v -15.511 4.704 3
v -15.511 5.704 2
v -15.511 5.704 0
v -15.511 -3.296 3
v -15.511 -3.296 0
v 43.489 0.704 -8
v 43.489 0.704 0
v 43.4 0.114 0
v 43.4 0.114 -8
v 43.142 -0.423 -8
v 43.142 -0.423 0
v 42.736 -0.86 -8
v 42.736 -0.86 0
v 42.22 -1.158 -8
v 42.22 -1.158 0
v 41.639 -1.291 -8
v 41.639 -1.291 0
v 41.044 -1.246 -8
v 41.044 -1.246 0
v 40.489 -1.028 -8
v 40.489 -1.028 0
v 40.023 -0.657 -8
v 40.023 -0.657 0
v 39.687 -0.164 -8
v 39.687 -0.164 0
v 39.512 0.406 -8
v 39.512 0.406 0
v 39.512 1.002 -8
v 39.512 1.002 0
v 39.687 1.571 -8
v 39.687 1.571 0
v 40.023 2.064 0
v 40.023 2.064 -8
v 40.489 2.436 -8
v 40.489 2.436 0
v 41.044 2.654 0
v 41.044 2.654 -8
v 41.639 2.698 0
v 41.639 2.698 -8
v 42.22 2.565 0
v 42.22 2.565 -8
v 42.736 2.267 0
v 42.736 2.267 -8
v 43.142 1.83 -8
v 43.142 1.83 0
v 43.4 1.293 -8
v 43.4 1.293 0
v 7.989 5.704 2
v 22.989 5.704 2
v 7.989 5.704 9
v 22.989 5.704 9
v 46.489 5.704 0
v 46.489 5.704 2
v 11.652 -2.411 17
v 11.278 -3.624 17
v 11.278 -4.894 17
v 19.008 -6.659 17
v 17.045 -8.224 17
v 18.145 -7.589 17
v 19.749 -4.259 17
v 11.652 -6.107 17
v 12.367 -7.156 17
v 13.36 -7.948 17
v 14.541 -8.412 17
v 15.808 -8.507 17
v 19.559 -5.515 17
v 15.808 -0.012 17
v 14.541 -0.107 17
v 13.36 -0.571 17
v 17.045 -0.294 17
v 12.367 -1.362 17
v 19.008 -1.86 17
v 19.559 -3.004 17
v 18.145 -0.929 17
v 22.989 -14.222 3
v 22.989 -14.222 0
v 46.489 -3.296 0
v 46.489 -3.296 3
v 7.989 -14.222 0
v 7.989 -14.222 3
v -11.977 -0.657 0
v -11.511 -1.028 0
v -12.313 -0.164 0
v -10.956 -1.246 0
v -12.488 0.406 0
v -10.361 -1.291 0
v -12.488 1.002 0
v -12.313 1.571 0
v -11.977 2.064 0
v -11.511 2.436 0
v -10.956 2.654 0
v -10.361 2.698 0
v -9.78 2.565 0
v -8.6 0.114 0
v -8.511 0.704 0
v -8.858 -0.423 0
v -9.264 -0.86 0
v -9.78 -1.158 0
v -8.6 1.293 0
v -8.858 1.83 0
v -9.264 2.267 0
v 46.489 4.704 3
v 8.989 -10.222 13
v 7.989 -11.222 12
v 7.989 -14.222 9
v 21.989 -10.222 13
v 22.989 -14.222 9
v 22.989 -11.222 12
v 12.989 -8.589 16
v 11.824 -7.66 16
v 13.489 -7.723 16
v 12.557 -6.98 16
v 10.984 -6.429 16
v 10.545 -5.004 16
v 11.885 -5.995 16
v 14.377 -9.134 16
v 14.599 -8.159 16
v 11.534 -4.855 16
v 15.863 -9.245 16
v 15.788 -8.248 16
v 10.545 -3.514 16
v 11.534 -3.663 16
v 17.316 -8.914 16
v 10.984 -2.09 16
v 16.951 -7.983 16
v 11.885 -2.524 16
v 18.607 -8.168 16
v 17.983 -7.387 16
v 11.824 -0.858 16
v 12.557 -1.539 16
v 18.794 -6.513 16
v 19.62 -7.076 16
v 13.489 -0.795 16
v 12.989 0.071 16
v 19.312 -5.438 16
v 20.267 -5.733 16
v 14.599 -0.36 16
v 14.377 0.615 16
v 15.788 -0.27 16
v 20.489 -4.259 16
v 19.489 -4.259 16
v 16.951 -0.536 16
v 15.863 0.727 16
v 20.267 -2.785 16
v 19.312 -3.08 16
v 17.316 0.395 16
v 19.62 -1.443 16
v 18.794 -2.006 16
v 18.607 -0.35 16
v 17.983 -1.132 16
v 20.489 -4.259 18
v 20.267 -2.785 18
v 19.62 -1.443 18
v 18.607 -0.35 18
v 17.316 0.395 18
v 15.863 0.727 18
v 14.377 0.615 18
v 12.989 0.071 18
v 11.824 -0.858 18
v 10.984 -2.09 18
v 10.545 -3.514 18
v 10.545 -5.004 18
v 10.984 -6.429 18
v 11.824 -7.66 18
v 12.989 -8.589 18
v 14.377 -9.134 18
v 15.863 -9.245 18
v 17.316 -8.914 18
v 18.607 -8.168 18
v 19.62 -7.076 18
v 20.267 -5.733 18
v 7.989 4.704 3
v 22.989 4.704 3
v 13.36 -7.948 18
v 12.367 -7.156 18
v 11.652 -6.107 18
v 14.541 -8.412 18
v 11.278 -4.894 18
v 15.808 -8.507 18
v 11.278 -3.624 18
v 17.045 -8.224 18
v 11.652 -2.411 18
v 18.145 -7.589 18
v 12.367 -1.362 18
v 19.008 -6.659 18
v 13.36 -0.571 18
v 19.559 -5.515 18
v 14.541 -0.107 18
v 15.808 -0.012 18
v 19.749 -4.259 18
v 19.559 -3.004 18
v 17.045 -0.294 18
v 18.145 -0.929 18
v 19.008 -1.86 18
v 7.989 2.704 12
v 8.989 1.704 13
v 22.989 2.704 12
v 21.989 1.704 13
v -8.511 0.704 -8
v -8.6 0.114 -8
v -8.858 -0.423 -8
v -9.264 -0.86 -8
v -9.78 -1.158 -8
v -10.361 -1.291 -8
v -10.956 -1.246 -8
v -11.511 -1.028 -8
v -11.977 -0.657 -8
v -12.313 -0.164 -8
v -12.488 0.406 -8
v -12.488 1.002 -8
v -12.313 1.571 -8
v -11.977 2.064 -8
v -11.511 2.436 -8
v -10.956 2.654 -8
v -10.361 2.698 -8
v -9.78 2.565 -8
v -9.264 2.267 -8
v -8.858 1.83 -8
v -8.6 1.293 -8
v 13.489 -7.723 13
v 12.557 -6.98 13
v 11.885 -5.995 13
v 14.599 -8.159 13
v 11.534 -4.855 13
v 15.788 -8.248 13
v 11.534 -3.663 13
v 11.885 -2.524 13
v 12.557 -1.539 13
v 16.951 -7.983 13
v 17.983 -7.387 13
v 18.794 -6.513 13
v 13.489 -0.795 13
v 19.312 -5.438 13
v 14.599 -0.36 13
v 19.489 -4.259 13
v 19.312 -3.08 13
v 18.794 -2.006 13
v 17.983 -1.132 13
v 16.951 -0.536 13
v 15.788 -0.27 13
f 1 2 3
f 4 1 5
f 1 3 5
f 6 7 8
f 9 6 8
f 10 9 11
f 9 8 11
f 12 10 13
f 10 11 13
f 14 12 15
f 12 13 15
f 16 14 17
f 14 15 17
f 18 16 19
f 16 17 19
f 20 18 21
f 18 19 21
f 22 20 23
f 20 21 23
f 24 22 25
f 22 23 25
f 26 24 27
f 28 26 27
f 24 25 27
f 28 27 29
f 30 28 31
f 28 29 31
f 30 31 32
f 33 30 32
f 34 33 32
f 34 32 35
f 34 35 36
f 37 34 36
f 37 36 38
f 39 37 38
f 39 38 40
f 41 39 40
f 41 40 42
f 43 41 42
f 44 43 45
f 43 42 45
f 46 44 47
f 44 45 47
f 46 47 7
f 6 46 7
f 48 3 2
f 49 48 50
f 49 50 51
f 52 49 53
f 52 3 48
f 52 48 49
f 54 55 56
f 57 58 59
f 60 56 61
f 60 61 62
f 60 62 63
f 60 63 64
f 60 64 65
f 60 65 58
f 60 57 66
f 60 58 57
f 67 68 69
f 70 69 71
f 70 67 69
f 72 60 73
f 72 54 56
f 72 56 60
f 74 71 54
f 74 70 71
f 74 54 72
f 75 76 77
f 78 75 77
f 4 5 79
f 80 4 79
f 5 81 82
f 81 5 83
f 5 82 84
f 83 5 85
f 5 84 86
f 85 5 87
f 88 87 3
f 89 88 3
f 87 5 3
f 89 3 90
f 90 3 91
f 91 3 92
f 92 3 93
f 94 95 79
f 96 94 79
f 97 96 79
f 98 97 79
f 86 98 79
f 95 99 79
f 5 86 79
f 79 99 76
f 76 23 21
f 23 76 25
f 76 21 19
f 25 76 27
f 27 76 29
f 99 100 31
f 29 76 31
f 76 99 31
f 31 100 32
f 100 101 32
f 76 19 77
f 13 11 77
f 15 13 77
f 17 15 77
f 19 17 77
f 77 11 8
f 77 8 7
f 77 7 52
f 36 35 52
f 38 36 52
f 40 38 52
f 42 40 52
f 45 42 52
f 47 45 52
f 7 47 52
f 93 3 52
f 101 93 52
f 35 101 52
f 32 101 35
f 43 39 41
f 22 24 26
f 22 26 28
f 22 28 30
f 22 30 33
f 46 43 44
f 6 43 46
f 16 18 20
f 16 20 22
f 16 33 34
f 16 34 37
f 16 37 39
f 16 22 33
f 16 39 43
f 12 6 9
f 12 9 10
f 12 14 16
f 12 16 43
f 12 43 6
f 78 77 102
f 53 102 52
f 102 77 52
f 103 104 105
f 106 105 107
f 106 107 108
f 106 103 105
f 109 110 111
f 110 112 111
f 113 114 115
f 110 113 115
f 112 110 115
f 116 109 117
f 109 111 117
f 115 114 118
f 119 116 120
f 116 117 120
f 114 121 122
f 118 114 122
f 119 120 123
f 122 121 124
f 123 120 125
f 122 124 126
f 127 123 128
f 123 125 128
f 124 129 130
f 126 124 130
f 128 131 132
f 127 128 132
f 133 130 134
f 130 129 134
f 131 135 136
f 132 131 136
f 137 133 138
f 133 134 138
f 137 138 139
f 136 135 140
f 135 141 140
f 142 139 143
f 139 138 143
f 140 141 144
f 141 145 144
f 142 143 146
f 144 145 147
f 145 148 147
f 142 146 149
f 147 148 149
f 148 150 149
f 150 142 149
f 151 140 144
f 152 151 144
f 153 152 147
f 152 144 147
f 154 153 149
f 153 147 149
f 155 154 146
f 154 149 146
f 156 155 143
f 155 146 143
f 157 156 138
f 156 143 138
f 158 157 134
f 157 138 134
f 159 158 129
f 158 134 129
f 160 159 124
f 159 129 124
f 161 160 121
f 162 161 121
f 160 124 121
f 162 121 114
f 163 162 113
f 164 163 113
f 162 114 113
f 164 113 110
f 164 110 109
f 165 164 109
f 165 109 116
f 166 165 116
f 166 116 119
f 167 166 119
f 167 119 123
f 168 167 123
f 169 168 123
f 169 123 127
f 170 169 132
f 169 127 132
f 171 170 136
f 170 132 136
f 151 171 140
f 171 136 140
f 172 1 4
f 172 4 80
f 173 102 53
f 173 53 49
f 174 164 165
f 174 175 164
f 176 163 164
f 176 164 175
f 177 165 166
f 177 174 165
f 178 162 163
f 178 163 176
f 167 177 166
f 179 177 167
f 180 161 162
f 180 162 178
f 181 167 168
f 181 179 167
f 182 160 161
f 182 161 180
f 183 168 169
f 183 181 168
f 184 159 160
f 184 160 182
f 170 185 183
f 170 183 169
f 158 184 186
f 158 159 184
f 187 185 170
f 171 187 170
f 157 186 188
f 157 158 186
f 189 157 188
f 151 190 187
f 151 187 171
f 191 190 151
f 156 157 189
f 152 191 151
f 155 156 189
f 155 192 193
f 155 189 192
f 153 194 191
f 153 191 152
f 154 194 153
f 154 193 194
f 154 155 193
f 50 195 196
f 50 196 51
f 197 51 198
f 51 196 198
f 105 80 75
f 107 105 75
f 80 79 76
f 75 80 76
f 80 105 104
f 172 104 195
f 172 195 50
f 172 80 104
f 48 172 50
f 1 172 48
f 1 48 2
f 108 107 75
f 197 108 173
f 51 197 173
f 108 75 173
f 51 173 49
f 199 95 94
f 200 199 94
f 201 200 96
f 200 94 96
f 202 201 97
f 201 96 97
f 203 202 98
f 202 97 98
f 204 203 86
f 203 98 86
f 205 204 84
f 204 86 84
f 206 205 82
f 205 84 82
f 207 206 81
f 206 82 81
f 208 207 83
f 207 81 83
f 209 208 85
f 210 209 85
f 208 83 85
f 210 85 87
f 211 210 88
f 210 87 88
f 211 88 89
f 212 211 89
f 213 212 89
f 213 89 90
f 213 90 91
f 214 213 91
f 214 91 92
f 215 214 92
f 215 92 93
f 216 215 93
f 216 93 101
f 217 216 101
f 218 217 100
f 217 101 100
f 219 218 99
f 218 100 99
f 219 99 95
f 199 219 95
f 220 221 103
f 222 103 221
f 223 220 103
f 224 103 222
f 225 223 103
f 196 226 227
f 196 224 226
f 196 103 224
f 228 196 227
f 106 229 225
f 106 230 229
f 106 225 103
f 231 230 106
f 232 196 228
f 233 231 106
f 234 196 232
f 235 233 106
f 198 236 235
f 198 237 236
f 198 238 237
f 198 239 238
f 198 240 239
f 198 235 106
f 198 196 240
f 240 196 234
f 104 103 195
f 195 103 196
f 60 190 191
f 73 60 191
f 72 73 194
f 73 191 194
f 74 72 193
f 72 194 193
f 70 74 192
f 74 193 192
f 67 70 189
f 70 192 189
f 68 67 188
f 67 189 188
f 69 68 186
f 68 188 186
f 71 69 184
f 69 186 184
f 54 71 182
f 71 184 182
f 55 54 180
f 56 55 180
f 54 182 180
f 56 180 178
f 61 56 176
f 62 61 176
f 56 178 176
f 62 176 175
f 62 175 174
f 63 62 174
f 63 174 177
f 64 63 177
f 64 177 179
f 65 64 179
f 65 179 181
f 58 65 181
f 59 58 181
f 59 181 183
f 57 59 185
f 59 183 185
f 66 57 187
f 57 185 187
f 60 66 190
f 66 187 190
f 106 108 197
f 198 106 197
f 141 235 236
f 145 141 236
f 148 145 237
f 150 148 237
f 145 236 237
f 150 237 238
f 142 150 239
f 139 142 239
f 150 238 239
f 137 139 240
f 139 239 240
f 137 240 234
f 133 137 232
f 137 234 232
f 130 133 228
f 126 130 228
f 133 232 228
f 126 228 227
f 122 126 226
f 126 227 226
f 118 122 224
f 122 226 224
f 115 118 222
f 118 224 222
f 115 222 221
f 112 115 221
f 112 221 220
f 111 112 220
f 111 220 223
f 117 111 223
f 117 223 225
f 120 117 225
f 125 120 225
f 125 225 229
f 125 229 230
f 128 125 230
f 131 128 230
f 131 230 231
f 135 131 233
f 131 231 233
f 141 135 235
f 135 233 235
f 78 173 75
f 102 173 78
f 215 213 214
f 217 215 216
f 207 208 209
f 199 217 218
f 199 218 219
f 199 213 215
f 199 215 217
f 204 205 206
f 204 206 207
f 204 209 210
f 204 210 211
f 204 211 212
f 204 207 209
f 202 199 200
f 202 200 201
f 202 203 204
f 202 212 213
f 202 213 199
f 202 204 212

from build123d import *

# Parameters (mm, degrees)
SALIENTE_EXTRUIR2_DEPTH = 3
CROQUIS2_R              = 2
SALIENTE_EXTRUIR3_DEPTH = 8
CROQUIS3_W              = 15
CROQUIS3_H              = 19.925925926
SALIENTE_EXTRUIR4_DEPTH = 10
CHAFL_N1_SIZE           = 4
CHAFL_N2_SIZE           = 1
CROQUIS4_R              = 4
SALIENTE_EXTRUIR5_DEPTH = 3
CROQUIS5_R              = 5
SALIENTE_EXTRUIR6_DEPTH = 2
CROQUIS6_R              = 4.259259259
CORTAR_EXTRUIR1_DEPTH   = 1
CHAFL_N3_SIZE           = 1


with BuildPart() as part:
    # Croquis1 → Saliente-Extruir2 (new body)
    with BuildSketch(Plane.XY):
        Polygon((-15.510753344, -3.296296296), (7.989246656, -14.222222222), (22.989246656, -14.222222222), (46.489246656, -3.296296296), (46.489246656, 5.703703704), (-15.510753344, 5.703703704), align=None)
    extrude(amount=SALIENTE_EXTRUIR2_DEPTH)

    # Croquis2 → Saliente-Extruir3 (add)
    with BuildSketch(Plane(origin=(0, 0, 0), x_dir=(-1, 0, 0), z_dir=(0, 0, -1))):
        with Locations(Location((-41.489246656, 0.703703704, 0), (0, 0, 180))):
            Circle(CROQUIS2_R)
        with Locations(Location((10.510753344, 0.703703704, 0), (0, 0, 180))):
            Circle(CROQUIS2_R)
    extrude(amount=SALIENTE_EXTRUIR3_DEPTH)

    # Croquis3 → Saliente-Extruir4 (add)
    with BuildSketch(Plane.XY.offset(3)):
        with Locations((15.489246656, -4.259259259)):
            Rectangle(CROQUIS3_W, CROQUIS3_H)
    extrude(amount=SALIENTE_EXTRUIR4_DEPTH)

    # Chaflán1
    chafl_n1_edges = [part.edges().sort_by_distance(p)[0] for p in [
        (15.489246656, -14.222222222, 13),
        (15.489246656, 5.703703704, 13),
    ]]
    chamfer(chafl_n1_edges, length=CHAFL_N1_SIZE)

    # Chaflán2
    chafl_n2_edges = [part.edges().sort_by_distance(p)[0] for p in [
        (7.989246656, -4.259259259, 13),
        (22.989246656, -4.259259259, 13),
    ]]
    chamfer(chafl_n2_edges, length=CHAFL_N2_SIZE)

    # Croquis4 → Saliente-Extruir5 (add)
    with BuildSketch(Plane.XY.offset(13)):
        with Locations((15.489246656, -4.259259259)):
            Circle(CROQUIS4_R)
    extrude(amount=SALIENTE_EXTRUIR5_DEPTH)

    # Croquis5 → Saliente-Extruir6 (add)
    with BuildSketch(Plane.XY.offset(16)):
        with Locations((15.489246656, -4.259259259)):
            Circle(CROQUIS5_R)
    extrude(amount=SALIENTE_EXTRUIR6_DEPTH)

    # Croquis6 → Cortar-Extruir1 (cut)
    with BuildSketch(Plane.XY.offset(18)):
        with Locations((15.489246656, -4.259259259)):
            Circle(CROQUIS6_R)
    extrude(amount=-CORTAR_EXTRUIR1_DEPTH, mode=Mode.SUBTRACT)

    # Chaflán3
    chafl_n3_edges = [part.edges().sort_by_distance(p)[0] for p in [
        (34.739246656, 5.703703704, 3),
        (-3.760753344, 5.703703704, 3),
    ]]
    chamfer(chafl_n3_edges, length=CHAFL_N3_SIZE)


solid = part.part
